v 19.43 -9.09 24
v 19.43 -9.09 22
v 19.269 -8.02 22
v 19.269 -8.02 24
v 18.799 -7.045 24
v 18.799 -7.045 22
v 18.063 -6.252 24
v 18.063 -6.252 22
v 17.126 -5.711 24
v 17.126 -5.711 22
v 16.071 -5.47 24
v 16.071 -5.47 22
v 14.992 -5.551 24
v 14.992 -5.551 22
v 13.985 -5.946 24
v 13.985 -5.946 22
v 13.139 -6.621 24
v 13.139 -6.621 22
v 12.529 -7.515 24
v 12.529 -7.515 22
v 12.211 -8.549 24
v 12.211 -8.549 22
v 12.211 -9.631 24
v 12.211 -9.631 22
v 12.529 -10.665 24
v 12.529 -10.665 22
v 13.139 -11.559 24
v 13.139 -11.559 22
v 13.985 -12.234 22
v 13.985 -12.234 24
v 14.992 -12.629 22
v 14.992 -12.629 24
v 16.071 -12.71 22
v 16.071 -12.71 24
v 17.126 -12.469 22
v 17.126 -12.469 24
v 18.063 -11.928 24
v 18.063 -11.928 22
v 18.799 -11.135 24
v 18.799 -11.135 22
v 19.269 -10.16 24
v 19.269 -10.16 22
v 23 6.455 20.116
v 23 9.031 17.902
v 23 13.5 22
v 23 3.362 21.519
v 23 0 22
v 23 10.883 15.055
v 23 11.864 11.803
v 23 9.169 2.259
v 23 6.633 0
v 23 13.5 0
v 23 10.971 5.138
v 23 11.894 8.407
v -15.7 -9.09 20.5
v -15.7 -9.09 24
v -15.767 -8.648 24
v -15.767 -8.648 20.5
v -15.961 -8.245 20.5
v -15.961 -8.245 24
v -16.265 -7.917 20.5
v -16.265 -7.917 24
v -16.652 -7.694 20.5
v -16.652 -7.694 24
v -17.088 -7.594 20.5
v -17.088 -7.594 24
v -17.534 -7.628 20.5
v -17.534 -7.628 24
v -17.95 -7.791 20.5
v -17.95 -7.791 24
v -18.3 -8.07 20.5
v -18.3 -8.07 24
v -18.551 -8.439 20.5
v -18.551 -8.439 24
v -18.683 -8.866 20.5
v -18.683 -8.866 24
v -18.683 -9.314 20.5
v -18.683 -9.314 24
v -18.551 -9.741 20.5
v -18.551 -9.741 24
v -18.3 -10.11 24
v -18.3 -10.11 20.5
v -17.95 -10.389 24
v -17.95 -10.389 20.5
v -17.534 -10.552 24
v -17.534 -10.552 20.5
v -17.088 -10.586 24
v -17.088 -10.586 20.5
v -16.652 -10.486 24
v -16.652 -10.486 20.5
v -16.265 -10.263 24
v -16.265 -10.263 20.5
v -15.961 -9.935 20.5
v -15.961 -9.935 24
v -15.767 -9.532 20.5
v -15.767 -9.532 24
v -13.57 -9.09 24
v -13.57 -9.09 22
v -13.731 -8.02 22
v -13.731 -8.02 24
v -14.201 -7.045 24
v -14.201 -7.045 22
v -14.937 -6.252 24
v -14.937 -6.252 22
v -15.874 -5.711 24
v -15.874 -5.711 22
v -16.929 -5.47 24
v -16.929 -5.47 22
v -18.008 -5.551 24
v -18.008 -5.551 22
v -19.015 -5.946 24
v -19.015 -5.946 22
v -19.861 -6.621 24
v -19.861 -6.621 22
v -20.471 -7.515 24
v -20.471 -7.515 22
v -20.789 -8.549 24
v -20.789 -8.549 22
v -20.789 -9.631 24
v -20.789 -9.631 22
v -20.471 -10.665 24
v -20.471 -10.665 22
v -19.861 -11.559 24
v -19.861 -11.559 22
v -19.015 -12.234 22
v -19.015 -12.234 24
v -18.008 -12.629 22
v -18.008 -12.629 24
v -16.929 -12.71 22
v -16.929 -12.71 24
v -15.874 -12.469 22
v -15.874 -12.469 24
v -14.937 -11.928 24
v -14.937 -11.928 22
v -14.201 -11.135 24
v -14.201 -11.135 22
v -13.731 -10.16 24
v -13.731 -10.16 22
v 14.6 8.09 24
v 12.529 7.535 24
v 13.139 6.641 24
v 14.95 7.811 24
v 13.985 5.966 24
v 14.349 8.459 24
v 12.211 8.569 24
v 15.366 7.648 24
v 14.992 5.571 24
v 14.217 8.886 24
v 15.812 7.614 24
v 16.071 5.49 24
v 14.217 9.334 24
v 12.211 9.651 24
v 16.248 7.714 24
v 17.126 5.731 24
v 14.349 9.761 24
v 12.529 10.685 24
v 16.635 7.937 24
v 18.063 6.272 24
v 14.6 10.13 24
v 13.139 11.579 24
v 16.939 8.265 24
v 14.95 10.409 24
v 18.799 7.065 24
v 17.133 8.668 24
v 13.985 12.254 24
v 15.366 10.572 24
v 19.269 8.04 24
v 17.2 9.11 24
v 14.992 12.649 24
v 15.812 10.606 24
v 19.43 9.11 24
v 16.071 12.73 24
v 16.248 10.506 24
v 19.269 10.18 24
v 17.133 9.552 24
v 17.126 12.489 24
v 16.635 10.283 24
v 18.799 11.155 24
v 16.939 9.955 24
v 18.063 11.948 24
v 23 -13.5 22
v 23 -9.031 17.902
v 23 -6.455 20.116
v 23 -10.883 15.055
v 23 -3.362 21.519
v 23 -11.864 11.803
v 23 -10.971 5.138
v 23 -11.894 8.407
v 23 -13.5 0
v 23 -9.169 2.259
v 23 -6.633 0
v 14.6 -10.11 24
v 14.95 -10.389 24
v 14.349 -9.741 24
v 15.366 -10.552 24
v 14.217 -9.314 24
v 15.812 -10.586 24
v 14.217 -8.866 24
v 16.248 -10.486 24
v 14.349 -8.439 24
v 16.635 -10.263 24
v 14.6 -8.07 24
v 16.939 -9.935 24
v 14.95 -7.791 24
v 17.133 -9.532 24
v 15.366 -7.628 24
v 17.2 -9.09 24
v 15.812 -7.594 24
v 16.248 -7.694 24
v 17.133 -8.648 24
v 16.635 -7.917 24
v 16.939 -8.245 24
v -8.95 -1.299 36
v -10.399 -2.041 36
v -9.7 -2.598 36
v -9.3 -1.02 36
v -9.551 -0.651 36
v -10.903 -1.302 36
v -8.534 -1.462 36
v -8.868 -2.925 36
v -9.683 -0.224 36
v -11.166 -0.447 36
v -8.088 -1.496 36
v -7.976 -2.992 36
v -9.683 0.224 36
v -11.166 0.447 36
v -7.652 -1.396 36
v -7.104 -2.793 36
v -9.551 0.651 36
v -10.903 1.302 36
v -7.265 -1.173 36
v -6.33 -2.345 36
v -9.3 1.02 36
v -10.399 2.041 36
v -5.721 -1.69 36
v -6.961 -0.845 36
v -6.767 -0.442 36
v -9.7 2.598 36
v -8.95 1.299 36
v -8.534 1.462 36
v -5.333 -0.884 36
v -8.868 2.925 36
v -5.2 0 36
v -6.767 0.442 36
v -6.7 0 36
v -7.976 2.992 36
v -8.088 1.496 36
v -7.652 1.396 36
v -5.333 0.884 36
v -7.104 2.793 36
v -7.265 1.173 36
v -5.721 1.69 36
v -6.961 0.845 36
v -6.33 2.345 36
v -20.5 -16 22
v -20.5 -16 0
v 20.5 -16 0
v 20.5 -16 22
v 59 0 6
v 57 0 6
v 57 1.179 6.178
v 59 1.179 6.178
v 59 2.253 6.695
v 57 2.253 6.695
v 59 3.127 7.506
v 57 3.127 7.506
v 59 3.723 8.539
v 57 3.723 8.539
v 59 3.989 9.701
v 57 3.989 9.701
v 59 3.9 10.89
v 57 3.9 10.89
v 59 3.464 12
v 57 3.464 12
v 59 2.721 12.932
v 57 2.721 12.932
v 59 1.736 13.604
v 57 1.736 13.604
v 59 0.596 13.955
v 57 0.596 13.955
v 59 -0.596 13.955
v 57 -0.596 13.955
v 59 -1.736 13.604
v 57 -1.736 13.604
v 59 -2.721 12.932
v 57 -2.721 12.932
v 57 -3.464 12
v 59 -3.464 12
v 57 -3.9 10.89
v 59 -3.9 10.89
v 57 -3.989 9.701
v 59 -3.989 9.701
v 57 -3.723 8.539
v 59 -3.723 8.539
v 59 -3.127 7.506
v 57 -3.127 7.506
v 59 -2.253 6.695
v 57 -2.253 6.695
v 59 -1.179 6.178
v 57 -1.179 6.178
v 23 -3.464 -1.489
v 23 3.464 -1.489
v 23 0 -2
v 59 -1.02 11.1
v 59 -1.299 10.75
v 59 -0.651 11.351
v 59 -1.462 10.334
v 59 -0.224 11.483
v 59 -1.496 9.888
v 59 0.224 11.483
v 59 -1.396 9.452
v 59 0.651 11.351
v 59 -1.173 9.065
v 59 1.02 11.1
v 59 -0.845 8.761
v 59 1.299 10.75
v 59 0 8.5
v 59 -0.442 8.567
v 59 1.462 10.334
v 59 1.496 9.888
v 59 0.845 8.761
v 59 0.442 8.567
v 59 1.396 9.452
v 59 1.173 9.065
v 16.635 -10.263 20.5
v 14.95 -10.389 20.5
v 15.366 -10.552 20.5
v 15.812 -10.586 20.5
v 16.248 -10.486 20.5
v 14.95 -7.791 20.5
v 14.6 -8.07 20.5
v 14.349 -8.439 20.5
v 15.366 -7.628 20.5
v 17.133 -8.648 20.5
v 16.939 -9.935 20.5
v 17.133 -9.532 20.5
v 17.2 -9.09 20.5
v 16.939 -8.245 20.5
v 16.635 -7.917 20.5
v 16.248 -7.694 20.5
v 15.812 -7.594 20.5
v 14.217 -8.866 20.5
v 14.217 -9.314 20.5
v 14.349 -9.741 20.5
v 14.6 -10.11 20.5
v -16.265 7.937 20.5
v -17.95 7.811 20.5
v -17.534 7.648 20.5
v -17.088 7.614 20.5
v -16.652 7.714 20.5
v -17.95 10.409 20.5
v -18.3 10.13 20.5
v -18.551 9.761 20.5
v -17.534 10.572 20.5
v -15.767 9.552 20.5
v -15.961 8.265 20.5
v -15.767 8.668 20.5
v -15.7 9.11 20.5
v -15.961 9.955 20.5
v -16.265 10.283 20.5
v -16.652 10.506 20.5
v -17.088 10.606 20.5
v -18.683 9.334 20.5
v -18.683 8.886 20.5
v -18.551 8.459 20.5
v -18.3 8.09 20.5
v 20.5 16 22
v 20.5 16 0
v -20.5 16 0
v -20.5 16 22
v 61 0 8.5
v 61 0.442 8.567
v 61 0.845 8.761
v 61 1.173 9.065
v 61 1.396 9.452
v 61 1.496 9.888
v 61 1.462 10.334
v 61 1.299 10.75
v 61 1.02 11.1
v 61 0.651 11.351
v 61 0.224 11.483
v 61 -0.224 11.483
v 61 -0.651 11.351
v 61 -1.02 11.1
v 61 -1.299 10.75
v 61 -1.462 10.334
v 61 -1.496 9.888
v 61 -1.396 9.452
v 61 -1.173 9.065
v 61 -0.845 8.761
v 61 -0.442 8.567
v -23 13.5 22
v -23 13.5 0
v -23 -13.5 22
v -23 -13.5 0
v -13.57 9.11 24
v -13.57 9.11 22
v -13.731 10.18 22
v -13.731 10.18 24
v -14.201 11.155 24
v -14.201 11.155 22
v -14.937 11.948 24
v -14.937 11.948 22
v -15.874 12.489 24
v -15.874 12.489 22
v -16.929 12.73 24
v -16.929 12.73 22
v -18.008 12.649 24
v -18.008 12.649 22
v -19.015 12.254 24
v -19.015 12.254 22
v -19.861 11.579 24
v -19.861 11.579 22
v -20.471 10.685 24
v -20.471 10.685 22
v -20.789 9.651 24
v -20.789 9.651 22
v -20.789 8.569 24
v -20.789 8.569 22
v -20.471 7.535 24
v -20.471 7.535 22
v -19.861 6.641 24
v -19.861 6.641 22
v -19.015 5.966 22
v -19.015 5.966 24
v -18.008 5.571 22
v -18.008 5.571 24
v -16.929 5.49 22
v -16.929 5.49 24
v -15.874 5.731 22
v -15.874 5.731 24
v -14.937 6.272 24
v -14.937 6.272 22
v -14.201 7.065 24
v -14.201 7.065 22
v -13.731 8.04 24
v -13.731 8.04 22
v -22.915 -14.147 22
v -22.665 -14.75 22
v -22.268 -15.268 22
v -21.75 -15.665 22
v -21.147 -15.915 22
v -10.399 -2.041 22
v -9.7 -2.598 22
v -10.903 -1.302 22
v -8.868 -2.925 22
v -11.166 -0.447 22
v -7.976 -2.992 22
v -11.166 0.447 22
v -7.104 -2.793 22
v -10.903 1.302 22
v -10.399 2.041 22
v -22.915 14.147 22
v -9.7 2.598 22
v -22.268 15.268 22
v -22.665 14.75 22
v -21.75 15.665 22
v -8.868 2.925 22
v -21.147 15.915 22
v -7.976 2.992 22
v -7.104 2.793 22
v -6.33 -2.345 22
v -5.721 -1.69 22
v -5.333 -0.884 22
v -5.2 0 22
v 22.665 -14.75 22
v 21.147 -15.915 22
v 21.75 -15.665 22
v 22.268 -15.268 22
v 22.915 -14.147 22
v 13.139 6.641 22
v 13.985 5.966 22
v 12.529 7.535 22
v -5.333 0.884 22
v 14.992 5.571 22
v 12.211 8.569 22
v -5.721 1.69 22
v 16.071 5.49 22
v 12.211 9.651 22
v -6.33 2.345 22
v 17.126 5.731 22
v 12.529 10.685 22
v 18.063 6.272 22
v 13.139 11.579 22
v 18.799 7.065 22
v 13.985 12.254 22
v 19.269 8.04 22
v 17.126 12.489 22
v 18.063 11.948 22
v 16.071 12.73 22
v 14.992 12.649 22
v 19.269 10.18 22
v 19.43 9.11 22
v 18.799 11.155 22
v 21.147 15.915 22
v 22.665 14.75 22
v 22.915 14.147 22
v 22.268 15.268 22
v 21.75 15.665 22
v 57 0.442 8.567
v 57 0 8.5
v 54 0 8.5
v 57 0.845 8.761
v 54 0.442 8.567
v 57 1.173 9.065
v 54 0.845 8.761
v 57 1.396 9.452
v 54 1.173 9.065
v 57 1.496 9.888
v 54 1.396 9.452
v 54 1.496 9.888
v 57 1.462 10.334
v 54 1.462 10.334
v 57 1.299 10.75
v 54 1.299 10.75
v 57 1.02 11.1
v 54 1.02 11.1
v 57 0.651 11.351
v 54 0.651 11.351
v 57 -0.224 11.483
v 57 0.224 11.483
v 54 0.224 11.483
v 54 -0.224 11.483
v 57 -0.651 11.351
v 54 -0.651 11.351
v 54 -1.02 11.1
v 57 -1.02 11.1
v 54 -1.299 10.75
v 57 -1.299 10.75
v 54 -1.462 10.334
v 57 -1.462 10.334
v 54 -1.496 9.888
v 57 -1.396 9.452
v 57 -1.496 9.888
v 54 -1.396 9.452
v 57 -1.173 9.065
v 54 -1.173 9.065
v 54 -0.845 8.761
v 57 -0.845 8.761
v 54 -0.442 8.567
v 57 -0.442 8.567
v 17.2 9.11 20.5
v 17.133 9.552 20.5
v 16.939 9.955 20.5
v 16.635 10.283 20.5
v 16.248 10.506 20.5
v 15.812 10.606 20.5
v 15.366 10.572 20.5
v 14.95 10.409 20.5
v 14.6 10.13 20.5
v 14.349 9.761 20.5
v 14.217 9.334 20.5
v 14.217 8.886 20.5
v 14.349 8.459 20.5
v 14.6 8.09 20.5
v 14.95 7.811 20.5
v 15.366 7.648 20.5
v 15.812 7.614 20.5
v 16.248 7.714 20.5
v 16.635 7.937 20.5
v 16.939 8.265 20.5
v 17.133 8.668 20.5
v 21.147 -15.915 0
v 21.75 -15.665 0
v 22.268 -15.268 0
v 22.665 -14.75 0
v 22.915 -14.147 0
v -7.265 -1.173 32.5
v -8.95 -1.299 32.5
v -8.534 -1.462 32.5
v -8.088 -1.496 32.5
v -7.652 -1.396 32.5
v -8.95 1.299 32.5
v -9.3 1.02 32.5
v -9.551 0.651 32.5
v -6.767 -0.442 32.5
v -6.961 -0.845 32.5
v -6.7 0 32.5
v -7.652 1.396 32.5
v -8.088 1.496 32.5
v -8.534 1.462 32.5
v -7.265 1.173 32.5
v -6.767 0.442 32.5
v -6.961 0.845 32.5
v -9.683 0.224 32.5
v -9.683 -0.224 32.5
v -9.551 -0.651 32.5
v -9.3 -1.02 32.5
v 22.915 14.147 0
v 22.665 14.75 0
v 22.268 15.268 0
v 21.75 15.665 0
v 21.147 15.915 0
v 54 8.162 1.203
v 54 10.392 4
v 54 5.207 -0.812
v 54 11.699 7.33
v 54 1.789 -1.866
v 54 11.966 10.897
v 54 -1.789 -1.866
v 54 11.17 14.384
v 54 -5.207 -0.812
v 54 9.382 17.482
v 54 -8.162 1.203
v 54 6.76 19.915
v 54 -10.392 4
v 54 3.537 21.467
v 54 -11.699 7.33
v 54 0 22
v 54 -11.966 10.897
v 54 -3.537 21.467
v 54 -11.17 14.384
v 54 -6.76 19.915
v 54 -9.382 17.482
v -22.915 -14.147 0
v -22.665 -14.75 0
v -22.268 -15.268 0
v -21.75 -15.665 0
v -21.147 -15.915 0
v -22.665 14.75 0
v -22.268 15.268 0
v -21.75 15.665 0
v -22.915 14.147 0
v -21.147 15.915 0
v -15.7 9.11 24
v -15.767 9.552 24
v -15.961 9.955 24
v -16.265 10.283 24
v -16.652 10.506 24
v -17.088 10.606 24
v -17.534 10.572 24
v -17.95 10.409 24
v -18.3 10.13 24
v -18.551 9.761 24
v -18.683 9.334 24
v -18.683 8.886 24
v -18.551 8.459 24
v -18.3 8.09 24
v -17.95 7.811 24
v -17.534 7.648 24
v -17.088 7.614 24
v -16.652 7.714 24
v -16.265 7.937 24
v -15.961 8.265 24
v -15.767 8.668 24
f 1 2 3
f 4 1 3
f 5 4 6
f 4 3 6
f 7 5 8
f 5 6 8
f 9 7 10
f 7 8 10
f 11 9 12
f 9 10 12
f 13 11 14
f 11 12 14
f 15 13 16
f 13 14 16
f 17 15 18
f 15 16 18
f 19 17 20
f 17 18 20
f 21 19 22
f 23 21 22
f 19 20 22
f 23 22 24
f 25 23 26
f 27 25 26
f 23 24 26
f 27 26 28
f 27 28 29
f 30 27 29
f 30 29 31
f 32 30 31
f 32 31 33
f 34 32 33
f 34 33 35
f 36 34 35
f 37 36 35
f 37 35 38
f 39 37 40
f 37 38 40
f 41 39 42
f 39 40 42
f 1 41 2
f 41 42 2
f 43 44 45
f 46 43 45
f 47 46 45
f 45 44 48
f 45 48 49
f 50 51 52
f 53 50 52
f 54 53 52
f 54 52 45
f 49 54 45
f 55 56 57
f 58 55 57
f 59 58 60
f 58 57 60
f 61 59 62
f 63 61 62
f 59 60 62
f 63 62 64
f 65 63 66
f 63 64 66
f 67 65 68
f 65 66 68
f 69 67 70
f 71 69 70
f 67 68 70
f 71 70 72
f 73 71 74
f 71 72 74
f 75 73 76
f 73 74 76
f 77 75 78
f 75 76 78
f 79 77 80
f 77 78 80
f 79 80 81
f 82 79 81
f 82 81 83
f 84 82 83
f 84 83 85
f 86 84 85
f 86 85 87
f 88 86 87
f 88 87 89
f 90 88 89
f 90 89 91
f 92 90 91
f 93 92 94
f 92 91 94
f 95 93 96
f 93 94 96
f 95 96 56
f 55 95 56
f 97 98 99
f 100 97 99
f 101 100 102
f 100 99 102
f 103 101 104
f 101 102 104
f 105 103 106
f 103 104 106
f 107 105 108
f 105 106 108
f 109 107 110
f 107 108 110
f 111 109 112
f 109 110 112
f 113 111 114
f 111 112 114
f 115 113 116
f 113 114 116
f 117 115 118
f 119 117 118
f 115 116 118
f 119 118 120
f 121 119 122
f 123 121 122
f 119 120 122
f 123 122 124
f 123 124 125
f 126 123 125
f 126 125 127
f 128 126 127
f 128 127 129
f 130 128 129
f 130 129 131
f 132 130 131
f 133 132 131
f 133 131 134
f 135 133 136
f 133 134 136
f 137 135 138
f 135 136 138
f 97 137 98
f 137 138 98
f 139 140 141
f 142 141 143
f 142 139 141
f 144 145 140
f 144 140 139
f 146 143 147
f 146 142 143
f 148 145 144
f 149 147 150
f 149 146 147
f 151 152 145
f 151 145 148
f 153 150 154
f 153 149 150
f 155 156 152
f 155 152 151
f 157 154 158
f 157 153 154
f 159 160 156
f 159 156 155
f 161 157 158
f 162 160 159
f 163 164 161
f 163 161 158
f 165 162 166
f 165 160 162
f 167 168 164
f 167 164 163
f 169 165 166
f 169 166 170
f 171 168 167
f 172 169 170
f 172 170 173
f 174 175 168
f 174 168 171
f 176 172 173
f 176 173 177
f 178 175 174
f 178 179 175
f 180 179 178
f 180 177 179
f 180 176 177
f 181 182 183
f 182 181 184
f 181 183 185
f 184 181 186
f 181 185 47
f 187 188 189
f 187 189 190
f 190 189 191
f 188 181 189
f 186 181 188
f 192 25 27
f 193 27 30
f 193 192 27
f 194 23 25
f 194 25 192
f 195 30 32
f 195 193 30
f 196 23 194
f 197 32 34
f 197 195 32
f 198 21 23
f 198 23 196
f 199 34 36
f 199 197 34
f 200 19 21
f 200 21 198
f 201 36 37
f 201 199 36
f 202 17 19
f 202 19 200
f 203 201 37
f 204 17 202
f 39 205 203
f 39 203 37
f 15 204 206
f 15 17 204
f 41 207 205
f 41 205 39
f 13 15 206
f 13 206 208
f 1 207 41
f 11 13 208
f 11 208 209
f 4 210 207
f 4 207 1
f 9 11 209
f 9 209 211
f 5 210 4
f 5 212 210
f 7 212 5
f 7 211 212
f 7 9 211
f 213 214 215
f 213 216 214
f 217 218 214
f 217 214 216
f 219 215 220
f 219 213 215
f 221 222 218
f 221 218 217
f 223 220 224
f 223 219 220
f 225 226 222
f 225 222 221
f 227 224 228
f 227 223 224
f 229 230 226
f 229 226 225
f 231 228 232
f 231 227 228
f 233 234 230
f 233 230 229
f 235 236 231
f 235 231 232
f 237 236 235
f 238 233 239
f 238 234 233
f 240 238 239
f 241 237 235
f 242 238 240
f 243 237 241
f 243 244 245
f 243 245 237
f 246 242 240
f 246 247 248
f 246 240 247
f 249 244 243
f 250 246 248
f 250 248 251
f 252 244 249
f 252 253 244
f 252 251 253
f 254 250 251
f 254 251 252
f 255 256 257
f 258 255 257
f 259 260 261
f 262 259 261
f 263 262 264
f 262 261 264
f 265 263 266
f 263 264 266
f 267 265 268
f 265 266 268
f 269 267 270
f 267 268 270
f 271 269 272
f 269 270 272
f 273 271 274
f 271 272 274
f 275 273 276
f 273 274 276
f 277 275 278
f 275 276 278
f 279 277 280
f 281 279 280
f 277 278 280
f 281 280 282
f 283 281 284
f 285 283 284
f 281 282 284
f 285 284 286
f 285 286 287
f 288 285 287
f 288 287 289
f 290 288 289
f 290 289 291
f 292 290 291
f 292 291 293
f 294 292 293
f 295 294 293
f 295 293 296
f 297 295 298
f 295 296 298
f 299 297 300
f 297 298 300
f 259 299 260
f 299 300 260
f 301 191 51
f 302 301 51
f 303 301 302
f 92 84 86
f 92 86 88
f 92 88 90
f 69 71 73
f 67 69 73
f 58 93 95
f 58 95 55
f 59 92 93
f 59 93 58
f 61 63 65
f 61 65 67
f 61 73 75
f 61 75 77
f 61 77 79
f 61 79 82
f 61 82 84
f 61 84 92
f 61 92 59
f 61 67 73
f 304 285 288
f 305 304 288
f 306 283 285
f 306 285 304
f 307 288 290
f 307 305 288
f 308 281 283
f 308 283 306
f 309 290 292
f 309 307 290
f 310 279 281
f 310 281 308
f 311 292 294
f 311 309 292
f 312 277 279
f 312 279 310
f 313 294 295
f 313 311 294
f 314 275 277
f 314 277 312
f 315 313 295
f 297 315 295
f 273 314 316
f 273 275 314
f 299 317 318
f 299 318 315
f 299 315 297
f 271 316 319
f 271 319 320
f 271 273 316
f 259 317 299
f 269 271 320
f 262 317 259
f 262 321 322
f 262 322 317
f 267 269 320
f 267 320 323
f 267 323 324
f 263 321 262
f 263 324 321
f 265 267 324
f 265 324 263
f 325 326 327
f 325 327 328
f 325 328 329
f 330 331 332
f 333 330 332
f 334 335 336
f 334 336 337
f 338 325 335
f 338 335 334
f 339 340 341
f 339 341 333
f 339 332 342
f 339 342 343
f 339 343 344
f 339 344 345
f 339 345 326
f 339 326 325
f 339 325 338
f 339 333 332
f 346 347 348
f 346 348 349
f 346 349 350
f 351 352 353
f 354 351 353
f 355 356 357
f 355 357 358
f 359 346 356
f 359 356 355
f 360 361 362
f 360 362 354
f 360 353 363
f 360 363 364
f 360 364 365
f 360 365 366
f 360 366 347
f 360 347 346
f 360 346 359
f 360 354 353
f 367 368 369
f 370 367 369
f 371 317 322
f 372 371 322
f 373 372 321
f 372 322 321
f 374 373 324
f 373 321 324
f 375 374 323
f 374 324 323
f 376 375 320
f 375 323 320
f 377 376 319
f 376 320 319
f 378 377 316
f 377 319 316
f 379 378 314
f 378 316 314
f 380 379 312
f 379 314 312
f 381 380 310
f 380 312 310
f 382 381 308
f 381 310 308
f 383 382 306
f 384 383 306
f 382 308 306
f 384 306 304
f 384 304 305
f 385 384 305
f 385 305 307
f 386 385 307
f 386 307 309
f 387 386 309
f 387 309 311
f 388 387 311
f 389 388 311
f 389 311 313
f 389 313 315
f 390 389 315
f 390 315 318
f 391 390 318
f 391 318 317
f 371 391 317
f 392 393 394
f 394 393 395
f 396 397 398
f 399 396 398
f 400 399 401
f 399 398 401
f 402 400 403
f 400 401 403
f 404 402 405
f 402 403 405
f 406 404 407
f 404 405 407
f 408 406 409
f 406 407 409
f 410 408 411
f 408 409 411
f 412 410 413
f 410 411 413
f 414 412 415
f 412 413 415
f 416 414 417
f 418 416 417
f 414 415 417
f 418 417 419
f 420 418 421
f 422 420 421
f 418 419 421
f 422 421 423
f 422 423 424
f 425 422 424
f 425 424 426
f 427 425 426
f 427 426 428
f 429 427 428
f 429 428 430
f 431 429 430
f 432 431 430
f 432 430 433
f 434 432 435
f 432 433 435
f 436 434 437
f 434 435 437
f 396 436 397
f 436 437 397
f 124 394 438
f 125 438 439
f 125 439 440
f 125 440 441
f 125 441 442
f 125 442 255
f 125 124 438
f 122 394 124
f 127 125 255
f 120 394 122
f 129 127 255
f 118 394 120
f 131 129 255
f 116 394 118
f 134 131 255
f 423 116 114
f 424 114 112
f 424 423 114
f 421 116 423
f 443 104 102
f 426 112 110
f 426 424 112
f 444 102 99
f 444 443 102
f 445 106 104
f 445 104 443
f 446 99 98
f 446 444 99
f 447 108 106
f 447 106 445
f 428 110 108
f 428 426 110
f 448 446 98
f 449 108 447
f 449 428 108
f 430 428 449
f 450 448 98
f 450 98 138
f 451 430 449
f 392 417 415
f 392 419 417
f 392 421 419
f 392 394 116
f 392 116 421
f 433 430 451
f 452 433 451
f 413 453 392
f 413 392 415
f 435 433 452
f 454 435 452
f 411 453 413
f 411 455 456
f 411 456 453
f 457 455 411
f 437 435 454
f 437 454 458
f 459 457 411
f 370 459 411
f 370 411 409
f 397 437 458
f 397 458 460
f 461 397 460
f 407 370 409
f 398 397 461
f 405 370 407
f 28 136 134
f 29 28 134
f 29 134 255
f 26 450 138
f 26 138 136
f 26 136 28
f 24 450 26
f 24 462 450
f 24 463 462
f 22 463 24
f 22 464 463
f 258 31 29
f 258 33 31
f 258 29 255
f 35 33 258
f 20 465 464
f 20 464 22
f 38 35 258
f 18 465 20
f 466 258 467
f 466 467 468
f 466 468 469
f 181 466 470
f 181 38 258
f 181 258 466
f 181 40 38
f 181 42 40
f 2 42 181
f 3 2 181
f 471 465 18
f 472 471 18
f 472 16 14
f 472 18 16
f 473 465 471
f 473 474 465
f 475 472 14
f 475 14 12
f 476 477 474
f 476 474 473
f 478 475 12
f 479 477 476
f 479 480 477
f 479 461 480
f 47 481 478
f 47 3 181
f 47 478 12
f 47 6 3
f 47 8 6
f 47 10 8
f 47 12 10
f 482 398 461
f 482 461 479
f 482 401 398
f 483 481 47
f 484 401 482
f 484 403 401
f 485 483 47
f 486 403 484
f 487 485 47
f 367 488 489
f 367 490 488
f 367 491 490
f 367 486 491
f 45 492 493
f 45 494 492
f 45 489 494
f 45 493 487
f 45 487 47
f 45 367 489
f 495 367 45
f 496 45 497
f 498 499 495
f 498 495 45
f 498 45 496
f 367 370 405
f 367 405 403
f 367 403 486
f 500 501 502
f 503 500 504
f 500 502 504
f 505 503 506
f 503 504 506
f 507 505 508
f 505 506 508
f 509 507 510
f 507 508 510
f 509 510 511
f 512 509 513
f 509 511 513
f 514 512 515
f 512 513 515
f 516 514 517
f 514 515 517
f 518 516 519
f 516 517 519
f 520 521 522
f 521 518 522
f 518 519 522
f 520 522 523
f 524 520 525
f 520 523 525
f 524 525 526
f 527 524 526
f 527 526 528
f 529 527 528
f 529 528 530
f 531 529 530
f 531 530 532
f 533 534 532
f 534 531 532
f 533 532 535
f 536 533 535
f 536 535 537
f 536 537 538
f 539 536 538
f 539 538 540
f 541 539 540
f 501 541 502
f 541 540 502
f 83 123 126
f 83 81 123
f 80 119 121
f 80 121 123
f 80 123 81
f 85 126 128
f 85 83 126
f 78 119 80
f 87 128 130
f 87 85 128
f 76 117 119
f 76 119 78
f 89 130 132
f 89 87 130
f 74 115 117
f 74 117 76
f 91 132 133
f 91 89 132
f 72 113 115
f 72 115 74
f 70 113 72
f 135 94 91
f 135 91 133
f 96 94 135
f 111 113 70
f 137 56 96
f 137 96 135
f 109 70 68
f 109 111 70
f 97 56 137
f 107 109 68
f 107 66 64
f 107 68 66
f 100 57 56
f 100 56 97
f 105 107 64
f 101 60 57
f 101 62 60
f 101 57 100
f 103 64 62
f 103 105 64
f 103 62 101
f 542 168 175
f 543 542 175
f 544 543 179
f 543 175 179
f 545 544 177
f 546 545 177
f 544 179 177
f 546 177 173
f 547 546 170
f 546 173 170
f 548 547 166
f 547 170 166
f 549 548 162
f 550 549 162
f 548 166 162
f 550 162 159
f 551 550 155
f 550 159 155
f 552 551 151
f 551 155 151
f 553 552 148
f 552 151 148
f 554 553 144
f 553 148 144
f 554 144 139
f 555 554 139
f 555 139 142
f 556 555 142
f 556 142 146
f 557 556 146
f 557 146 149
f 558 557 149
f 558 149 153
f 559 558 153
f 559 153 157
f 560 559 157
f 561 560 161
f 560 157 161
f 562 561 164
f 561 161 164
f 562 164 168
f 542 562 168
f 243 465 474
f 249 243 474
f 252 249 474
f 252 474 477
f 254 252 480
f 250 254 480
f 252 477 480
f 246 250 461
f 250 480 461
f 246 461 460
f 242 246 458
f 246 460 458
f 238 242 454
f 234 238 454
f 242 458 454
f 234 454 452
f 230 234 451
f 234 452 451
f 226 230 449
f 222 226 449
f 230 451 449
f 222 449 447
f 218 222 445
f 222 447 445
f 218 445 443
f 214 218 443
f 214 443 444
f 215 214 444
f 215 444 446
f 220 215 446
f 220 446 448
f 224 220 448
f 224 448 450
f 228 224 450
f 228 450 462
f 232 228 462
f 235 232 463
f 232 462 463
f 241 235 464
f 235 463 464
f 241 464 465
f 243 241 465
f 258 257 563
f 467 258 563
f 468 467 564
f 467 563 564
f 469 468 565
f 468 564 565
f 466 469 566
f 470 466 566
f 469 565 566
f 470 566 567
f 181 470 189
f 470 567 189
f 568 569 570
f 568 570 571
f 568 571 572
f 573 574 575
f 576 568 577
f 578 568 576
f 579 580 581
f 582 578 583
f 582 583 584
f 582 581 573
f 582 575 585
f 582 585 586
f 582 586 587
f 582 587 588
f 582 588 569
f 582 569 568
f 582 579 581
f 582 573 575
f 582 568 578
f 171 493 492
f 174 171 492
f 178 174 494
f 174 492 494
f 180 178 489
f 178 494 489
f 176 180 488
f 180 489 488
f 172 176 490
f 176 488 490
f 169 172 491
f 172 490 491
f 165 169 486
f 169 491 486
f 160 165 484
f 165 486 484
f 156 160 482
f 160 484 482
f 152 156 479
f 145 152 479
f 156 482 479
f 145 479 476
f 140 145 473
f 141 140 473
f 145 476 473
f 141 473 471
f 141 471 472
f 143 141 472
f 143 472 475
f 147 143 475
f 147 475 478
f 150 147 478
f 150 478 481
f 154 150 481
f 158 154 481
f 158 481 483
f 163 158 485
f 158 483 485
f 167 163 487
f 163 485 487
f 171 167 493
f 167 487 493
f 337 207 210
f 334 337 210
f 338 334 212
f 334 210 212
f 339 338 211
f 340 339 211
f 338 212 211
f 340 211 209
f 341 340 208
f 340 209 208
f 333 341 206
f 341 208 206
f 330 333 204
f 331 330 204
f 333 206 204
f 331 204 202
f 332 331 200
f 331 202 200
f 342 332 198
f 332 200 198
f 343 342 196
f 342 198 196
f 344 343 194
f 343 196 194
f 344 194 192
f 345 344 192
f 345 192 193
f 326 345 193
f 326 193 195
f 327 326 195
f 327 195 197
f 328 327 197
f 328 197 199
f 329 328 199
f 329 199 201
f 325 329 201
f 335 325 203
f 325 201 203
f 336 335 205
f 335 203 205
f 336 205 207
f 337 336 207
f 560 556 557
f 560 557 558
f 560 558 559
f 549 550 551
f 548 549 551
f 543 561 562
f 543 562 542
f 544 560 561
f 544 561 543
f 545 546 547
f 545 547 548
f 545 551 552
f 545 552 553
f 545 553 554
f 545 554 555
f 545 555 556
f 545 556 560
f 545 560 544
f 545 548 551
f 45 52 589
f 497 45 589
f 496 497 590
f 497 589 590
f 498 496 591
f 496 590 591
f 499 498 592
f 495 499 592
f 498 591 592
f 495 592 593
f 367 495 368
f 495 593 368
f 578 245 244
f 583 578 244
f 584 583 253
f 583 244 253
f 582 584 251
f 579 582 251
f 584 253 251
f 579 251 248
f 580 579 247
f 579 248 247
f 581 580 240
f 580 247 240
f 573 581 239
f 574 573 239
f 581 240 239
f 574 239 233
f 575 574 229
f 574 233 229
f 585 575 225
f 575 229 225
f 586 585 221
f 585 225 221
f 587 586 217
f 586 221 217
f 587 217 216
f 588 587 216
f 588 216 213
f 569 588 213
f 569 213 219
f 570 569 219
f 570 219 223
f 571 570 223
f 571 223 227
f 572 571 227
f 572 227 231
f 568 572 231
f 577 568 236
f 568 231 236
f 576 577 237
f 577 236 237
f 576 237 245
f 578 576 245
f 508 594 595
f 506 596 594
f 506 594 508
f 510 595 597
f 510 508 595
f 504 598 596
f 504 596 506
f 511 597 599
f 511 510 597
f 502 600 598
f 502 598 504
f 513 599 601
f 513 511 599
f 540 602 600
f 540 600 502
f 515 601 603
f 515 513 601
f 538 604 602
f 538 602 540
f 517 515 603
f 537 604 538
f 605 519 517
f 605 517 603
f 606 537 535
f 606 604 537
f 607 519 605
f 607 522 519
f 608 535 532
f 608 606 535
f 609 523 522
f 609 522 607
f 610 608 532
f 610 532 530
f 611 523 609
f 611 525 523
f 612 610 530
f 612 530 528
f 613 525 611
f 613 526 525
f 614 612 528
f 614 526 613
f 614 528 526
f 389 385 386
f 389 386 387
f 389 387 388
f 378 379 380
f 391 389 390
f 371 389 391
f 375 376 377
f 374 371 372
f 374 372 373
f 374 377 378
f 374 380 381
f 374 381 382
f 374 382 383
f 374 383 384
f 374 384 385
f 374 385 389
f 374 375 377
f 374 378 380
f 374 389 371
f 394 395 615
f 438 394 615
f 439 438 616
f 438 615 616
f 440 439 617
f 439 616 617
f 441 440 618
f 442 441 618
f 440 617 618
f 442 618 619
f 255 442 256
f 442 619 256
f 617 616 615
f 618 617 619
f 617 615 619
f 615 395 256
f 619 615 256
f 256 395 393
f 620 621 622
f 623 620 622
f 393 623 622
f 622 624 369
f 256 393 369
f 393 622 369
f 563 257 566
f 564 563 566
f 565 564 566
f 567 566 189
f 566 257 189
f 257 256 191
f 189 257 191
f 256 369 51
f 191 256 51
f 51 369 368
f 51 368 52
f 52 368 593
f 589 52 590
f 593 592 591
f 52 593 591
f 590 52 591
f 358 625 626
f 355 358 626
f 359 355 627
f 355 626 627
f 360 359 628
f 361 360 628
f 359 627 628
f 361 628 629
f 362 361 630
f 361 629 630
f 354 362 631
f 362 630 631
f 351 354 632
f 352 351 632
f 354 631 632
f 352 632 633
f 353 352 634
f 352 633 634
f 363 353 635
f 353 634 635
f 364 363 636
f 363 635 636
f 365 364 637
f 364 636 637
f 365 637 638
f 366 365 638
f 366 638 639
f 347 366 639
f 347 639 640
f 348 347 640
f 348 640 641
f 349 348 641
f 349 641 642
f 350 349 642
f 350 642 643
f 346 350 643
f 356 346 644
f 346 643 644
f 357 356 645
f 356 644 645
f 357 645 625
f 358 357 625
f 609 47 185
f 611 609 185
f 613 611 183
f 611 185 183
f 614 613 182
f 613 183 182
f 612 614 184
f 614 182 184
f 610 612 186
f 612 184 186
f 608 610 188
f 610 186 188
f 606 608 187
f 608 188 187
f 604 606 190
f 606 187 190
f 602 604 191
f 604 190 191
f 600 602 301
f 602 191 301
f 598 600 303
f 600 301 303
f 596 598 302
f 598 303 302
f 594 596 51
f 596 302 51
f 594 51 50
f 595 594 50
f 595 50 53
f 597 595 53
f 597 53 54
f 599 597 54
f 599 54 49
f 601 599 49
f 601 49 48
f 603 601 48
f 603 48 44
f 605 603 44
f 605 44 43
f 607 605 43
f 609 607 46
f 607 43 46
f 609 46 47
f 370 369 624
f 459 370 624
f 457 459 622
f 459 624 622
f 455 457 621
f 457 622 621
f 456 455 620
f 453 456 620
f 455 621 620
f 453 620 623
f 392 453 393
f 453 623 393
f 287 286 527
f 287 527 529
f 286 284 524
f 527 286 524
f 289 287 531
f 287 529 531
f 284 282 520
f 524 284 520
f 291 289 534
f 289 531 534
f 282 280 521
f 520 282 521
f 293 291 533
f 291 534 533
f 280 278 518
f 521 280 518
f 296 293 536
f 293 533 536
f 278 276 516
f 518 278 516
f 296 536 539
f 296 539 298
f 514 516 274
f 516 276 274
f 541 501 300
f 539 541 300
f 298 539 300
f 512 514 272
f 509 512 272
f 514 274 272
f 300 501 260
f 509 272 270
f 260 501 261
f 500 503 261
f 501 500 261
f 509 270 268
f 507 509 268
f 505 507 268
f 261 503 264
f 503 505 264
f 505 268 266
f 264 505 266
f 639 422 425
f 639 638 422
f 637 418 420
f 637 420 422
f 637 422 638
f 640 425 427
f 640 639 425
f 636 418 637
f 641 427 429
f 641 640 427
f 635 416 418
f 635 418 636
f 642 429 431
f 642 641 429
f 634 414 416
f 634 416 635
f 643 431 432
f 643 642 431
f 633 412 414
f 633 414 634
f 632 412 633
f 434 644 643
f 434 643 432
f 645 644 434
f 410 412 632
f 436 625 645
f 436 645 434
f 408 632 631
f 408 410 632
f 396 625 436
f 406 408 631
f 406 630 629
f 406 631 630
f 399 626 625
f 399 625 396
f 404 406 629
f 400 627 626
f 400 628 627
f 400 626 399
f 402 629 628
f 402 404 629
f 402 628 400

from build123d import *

# Parameters (mm, degrees)
BOSS_EXTRUDE1_DEPTH = 22
SKETCH2_R           = 3
BOSS_EXTRUDE2_DEPTH = 14
SKETCH5_R           = 3.63
BOSS_EXTRUDE3_DEPTH = 2
SKETCH7_R           = 1.5
CUT_EXTRUDE1_DEPTH  = 3.5
SKETCH8_R           = 12
BOSS_EXTRUDE4_DEPTH = 31
SKETCH9_R           = 1.5
BOSS_EXTRUDE5_DEPTH = 7
SKETCH10_R          = 4
BOSS_EXTRUDE6_DEPTH = 2
SKETCH11_R          = 1.5
CUT_EXTRUDE2_DEPTH  = 3.5


with BuildPart() as part:
    # Sketch1 → Boss-Extrude1 (new body)
    with BuildSketch(Plane.XY):
        with BuildLine():
            Line((-20.5, -16), (20.5, -16))
            ThreePointArc((20.5, -16), (22.267766953, -15.267766953), (23, -13.5))
            Line((23, -13.5), (23, 13.5))
            ThreePointArc((23, 13.5), (22.267766953, 15.267766953), (20.5, 16))
            Line((20.5, 16), (-20.5, 16))
            ThreePointArc((-20.5, 16), (-22.267766953, 15.267766953), (-23, 13.5))
            Line((-23, 13.5), (-23, -13.5))
            ThreePointArc((-23, -13.5), (-22.267766953, -15.267766953), (-20.5, -16))
        make_face()
    extrude(amount=BOSS_EXTRUDE1_DEPTH)

    # Sketch2 → Boss-Extrude2 (add)
    with BuildSketch(Plane.XY.offset(22)):
        with Locations((-8.2, 0)):
            Circle(SKETCH2_R)
    extrude(amount=BOSS_EXTRUDE2_DEPTH)

    # Sketch5 → Boss-Extrude3 (add)
    with BuildSketch(Plane.XY.offset(22)):
        with Locations((-17.2, 9.11)):
            Circle(SKETCH5_R)
        with Locations((-17.2, -9.09)):
            Circle(SKETCH5_R)
        with Locations((15.8, 9.11)):
            Circle(SKETCH5_R)
        with Locations((15.8, -9.09)):
            Circle(SKETCH5_R)
    extrude(amount=BOSS_EXTRUDE3_DEPTH)

    # Sketch7 → Cut-Extrude1 (cut)
    with BuildSketch(Plane.XY.offset(24)):
        with Locations((-17.2, 9.11)):
            Circle(SKETCH7_R)
        with Locations((-17.2, -9.09)):
            Circle(SKETCH7_R)
        with Locations((15.7, 9.11)):
            Circle(SKETCH7_R)
        with Locations((15.7, -9.09)):
            Circle(SKETCH7_R)
    extrude(amount=-CUT_EXTRUDE1_DEPTH, mode=Mode.SUBTRACT)

    # Sketch8 → Boss-Extrude4 (add)
    with BuildSketch(Plane(origin=(23, 0, 0), x_dir=(0, 0, -1), z_dir=(1, 0, 0))):
        with Locations(Location((-10, 0, 0), (0, 0, 180))):
            Circle(SKETCH8_R)
    extrude(amount=BOSS_EXTRUDE4_DEPTH)

    # Sketch9 → Boss-Extrude5 (add)
    with BuildSketch(Plane(origin=(54, 0, 0), x_dir=(0, 0, -1), z_dir=(1, 0, 0))):
        with Locations((-10, 0)):
            Circle(SKETCH9_R)
    extrude(amount=BOSS_EXTRUDE5_DEPTH)

    # Sketch10 → Boss-Extrude6 (add)
    with BuildSketch(Plane(origin=(57, 0, 0), x_dir=(0, 0, -1), z_dir=(1, 0, 0))):
        with Locations((-10, 0)):
            Circle(SKETCH10_R)
    extrude(amount=BOSS_EXTRUDE6_DEPTH)

    # Sketch11 → Cut-Extrude2 (cut)
    with BuildSketch(Plane.XY.offset(36)):
        with Locations((-8.2, 0)):
            Circle(SKETCH11_R)
    extrude(amount=-CUT_EXTRUDE2_DEPTH, mode=Mode.SUBTRACT)


solid = part.part
